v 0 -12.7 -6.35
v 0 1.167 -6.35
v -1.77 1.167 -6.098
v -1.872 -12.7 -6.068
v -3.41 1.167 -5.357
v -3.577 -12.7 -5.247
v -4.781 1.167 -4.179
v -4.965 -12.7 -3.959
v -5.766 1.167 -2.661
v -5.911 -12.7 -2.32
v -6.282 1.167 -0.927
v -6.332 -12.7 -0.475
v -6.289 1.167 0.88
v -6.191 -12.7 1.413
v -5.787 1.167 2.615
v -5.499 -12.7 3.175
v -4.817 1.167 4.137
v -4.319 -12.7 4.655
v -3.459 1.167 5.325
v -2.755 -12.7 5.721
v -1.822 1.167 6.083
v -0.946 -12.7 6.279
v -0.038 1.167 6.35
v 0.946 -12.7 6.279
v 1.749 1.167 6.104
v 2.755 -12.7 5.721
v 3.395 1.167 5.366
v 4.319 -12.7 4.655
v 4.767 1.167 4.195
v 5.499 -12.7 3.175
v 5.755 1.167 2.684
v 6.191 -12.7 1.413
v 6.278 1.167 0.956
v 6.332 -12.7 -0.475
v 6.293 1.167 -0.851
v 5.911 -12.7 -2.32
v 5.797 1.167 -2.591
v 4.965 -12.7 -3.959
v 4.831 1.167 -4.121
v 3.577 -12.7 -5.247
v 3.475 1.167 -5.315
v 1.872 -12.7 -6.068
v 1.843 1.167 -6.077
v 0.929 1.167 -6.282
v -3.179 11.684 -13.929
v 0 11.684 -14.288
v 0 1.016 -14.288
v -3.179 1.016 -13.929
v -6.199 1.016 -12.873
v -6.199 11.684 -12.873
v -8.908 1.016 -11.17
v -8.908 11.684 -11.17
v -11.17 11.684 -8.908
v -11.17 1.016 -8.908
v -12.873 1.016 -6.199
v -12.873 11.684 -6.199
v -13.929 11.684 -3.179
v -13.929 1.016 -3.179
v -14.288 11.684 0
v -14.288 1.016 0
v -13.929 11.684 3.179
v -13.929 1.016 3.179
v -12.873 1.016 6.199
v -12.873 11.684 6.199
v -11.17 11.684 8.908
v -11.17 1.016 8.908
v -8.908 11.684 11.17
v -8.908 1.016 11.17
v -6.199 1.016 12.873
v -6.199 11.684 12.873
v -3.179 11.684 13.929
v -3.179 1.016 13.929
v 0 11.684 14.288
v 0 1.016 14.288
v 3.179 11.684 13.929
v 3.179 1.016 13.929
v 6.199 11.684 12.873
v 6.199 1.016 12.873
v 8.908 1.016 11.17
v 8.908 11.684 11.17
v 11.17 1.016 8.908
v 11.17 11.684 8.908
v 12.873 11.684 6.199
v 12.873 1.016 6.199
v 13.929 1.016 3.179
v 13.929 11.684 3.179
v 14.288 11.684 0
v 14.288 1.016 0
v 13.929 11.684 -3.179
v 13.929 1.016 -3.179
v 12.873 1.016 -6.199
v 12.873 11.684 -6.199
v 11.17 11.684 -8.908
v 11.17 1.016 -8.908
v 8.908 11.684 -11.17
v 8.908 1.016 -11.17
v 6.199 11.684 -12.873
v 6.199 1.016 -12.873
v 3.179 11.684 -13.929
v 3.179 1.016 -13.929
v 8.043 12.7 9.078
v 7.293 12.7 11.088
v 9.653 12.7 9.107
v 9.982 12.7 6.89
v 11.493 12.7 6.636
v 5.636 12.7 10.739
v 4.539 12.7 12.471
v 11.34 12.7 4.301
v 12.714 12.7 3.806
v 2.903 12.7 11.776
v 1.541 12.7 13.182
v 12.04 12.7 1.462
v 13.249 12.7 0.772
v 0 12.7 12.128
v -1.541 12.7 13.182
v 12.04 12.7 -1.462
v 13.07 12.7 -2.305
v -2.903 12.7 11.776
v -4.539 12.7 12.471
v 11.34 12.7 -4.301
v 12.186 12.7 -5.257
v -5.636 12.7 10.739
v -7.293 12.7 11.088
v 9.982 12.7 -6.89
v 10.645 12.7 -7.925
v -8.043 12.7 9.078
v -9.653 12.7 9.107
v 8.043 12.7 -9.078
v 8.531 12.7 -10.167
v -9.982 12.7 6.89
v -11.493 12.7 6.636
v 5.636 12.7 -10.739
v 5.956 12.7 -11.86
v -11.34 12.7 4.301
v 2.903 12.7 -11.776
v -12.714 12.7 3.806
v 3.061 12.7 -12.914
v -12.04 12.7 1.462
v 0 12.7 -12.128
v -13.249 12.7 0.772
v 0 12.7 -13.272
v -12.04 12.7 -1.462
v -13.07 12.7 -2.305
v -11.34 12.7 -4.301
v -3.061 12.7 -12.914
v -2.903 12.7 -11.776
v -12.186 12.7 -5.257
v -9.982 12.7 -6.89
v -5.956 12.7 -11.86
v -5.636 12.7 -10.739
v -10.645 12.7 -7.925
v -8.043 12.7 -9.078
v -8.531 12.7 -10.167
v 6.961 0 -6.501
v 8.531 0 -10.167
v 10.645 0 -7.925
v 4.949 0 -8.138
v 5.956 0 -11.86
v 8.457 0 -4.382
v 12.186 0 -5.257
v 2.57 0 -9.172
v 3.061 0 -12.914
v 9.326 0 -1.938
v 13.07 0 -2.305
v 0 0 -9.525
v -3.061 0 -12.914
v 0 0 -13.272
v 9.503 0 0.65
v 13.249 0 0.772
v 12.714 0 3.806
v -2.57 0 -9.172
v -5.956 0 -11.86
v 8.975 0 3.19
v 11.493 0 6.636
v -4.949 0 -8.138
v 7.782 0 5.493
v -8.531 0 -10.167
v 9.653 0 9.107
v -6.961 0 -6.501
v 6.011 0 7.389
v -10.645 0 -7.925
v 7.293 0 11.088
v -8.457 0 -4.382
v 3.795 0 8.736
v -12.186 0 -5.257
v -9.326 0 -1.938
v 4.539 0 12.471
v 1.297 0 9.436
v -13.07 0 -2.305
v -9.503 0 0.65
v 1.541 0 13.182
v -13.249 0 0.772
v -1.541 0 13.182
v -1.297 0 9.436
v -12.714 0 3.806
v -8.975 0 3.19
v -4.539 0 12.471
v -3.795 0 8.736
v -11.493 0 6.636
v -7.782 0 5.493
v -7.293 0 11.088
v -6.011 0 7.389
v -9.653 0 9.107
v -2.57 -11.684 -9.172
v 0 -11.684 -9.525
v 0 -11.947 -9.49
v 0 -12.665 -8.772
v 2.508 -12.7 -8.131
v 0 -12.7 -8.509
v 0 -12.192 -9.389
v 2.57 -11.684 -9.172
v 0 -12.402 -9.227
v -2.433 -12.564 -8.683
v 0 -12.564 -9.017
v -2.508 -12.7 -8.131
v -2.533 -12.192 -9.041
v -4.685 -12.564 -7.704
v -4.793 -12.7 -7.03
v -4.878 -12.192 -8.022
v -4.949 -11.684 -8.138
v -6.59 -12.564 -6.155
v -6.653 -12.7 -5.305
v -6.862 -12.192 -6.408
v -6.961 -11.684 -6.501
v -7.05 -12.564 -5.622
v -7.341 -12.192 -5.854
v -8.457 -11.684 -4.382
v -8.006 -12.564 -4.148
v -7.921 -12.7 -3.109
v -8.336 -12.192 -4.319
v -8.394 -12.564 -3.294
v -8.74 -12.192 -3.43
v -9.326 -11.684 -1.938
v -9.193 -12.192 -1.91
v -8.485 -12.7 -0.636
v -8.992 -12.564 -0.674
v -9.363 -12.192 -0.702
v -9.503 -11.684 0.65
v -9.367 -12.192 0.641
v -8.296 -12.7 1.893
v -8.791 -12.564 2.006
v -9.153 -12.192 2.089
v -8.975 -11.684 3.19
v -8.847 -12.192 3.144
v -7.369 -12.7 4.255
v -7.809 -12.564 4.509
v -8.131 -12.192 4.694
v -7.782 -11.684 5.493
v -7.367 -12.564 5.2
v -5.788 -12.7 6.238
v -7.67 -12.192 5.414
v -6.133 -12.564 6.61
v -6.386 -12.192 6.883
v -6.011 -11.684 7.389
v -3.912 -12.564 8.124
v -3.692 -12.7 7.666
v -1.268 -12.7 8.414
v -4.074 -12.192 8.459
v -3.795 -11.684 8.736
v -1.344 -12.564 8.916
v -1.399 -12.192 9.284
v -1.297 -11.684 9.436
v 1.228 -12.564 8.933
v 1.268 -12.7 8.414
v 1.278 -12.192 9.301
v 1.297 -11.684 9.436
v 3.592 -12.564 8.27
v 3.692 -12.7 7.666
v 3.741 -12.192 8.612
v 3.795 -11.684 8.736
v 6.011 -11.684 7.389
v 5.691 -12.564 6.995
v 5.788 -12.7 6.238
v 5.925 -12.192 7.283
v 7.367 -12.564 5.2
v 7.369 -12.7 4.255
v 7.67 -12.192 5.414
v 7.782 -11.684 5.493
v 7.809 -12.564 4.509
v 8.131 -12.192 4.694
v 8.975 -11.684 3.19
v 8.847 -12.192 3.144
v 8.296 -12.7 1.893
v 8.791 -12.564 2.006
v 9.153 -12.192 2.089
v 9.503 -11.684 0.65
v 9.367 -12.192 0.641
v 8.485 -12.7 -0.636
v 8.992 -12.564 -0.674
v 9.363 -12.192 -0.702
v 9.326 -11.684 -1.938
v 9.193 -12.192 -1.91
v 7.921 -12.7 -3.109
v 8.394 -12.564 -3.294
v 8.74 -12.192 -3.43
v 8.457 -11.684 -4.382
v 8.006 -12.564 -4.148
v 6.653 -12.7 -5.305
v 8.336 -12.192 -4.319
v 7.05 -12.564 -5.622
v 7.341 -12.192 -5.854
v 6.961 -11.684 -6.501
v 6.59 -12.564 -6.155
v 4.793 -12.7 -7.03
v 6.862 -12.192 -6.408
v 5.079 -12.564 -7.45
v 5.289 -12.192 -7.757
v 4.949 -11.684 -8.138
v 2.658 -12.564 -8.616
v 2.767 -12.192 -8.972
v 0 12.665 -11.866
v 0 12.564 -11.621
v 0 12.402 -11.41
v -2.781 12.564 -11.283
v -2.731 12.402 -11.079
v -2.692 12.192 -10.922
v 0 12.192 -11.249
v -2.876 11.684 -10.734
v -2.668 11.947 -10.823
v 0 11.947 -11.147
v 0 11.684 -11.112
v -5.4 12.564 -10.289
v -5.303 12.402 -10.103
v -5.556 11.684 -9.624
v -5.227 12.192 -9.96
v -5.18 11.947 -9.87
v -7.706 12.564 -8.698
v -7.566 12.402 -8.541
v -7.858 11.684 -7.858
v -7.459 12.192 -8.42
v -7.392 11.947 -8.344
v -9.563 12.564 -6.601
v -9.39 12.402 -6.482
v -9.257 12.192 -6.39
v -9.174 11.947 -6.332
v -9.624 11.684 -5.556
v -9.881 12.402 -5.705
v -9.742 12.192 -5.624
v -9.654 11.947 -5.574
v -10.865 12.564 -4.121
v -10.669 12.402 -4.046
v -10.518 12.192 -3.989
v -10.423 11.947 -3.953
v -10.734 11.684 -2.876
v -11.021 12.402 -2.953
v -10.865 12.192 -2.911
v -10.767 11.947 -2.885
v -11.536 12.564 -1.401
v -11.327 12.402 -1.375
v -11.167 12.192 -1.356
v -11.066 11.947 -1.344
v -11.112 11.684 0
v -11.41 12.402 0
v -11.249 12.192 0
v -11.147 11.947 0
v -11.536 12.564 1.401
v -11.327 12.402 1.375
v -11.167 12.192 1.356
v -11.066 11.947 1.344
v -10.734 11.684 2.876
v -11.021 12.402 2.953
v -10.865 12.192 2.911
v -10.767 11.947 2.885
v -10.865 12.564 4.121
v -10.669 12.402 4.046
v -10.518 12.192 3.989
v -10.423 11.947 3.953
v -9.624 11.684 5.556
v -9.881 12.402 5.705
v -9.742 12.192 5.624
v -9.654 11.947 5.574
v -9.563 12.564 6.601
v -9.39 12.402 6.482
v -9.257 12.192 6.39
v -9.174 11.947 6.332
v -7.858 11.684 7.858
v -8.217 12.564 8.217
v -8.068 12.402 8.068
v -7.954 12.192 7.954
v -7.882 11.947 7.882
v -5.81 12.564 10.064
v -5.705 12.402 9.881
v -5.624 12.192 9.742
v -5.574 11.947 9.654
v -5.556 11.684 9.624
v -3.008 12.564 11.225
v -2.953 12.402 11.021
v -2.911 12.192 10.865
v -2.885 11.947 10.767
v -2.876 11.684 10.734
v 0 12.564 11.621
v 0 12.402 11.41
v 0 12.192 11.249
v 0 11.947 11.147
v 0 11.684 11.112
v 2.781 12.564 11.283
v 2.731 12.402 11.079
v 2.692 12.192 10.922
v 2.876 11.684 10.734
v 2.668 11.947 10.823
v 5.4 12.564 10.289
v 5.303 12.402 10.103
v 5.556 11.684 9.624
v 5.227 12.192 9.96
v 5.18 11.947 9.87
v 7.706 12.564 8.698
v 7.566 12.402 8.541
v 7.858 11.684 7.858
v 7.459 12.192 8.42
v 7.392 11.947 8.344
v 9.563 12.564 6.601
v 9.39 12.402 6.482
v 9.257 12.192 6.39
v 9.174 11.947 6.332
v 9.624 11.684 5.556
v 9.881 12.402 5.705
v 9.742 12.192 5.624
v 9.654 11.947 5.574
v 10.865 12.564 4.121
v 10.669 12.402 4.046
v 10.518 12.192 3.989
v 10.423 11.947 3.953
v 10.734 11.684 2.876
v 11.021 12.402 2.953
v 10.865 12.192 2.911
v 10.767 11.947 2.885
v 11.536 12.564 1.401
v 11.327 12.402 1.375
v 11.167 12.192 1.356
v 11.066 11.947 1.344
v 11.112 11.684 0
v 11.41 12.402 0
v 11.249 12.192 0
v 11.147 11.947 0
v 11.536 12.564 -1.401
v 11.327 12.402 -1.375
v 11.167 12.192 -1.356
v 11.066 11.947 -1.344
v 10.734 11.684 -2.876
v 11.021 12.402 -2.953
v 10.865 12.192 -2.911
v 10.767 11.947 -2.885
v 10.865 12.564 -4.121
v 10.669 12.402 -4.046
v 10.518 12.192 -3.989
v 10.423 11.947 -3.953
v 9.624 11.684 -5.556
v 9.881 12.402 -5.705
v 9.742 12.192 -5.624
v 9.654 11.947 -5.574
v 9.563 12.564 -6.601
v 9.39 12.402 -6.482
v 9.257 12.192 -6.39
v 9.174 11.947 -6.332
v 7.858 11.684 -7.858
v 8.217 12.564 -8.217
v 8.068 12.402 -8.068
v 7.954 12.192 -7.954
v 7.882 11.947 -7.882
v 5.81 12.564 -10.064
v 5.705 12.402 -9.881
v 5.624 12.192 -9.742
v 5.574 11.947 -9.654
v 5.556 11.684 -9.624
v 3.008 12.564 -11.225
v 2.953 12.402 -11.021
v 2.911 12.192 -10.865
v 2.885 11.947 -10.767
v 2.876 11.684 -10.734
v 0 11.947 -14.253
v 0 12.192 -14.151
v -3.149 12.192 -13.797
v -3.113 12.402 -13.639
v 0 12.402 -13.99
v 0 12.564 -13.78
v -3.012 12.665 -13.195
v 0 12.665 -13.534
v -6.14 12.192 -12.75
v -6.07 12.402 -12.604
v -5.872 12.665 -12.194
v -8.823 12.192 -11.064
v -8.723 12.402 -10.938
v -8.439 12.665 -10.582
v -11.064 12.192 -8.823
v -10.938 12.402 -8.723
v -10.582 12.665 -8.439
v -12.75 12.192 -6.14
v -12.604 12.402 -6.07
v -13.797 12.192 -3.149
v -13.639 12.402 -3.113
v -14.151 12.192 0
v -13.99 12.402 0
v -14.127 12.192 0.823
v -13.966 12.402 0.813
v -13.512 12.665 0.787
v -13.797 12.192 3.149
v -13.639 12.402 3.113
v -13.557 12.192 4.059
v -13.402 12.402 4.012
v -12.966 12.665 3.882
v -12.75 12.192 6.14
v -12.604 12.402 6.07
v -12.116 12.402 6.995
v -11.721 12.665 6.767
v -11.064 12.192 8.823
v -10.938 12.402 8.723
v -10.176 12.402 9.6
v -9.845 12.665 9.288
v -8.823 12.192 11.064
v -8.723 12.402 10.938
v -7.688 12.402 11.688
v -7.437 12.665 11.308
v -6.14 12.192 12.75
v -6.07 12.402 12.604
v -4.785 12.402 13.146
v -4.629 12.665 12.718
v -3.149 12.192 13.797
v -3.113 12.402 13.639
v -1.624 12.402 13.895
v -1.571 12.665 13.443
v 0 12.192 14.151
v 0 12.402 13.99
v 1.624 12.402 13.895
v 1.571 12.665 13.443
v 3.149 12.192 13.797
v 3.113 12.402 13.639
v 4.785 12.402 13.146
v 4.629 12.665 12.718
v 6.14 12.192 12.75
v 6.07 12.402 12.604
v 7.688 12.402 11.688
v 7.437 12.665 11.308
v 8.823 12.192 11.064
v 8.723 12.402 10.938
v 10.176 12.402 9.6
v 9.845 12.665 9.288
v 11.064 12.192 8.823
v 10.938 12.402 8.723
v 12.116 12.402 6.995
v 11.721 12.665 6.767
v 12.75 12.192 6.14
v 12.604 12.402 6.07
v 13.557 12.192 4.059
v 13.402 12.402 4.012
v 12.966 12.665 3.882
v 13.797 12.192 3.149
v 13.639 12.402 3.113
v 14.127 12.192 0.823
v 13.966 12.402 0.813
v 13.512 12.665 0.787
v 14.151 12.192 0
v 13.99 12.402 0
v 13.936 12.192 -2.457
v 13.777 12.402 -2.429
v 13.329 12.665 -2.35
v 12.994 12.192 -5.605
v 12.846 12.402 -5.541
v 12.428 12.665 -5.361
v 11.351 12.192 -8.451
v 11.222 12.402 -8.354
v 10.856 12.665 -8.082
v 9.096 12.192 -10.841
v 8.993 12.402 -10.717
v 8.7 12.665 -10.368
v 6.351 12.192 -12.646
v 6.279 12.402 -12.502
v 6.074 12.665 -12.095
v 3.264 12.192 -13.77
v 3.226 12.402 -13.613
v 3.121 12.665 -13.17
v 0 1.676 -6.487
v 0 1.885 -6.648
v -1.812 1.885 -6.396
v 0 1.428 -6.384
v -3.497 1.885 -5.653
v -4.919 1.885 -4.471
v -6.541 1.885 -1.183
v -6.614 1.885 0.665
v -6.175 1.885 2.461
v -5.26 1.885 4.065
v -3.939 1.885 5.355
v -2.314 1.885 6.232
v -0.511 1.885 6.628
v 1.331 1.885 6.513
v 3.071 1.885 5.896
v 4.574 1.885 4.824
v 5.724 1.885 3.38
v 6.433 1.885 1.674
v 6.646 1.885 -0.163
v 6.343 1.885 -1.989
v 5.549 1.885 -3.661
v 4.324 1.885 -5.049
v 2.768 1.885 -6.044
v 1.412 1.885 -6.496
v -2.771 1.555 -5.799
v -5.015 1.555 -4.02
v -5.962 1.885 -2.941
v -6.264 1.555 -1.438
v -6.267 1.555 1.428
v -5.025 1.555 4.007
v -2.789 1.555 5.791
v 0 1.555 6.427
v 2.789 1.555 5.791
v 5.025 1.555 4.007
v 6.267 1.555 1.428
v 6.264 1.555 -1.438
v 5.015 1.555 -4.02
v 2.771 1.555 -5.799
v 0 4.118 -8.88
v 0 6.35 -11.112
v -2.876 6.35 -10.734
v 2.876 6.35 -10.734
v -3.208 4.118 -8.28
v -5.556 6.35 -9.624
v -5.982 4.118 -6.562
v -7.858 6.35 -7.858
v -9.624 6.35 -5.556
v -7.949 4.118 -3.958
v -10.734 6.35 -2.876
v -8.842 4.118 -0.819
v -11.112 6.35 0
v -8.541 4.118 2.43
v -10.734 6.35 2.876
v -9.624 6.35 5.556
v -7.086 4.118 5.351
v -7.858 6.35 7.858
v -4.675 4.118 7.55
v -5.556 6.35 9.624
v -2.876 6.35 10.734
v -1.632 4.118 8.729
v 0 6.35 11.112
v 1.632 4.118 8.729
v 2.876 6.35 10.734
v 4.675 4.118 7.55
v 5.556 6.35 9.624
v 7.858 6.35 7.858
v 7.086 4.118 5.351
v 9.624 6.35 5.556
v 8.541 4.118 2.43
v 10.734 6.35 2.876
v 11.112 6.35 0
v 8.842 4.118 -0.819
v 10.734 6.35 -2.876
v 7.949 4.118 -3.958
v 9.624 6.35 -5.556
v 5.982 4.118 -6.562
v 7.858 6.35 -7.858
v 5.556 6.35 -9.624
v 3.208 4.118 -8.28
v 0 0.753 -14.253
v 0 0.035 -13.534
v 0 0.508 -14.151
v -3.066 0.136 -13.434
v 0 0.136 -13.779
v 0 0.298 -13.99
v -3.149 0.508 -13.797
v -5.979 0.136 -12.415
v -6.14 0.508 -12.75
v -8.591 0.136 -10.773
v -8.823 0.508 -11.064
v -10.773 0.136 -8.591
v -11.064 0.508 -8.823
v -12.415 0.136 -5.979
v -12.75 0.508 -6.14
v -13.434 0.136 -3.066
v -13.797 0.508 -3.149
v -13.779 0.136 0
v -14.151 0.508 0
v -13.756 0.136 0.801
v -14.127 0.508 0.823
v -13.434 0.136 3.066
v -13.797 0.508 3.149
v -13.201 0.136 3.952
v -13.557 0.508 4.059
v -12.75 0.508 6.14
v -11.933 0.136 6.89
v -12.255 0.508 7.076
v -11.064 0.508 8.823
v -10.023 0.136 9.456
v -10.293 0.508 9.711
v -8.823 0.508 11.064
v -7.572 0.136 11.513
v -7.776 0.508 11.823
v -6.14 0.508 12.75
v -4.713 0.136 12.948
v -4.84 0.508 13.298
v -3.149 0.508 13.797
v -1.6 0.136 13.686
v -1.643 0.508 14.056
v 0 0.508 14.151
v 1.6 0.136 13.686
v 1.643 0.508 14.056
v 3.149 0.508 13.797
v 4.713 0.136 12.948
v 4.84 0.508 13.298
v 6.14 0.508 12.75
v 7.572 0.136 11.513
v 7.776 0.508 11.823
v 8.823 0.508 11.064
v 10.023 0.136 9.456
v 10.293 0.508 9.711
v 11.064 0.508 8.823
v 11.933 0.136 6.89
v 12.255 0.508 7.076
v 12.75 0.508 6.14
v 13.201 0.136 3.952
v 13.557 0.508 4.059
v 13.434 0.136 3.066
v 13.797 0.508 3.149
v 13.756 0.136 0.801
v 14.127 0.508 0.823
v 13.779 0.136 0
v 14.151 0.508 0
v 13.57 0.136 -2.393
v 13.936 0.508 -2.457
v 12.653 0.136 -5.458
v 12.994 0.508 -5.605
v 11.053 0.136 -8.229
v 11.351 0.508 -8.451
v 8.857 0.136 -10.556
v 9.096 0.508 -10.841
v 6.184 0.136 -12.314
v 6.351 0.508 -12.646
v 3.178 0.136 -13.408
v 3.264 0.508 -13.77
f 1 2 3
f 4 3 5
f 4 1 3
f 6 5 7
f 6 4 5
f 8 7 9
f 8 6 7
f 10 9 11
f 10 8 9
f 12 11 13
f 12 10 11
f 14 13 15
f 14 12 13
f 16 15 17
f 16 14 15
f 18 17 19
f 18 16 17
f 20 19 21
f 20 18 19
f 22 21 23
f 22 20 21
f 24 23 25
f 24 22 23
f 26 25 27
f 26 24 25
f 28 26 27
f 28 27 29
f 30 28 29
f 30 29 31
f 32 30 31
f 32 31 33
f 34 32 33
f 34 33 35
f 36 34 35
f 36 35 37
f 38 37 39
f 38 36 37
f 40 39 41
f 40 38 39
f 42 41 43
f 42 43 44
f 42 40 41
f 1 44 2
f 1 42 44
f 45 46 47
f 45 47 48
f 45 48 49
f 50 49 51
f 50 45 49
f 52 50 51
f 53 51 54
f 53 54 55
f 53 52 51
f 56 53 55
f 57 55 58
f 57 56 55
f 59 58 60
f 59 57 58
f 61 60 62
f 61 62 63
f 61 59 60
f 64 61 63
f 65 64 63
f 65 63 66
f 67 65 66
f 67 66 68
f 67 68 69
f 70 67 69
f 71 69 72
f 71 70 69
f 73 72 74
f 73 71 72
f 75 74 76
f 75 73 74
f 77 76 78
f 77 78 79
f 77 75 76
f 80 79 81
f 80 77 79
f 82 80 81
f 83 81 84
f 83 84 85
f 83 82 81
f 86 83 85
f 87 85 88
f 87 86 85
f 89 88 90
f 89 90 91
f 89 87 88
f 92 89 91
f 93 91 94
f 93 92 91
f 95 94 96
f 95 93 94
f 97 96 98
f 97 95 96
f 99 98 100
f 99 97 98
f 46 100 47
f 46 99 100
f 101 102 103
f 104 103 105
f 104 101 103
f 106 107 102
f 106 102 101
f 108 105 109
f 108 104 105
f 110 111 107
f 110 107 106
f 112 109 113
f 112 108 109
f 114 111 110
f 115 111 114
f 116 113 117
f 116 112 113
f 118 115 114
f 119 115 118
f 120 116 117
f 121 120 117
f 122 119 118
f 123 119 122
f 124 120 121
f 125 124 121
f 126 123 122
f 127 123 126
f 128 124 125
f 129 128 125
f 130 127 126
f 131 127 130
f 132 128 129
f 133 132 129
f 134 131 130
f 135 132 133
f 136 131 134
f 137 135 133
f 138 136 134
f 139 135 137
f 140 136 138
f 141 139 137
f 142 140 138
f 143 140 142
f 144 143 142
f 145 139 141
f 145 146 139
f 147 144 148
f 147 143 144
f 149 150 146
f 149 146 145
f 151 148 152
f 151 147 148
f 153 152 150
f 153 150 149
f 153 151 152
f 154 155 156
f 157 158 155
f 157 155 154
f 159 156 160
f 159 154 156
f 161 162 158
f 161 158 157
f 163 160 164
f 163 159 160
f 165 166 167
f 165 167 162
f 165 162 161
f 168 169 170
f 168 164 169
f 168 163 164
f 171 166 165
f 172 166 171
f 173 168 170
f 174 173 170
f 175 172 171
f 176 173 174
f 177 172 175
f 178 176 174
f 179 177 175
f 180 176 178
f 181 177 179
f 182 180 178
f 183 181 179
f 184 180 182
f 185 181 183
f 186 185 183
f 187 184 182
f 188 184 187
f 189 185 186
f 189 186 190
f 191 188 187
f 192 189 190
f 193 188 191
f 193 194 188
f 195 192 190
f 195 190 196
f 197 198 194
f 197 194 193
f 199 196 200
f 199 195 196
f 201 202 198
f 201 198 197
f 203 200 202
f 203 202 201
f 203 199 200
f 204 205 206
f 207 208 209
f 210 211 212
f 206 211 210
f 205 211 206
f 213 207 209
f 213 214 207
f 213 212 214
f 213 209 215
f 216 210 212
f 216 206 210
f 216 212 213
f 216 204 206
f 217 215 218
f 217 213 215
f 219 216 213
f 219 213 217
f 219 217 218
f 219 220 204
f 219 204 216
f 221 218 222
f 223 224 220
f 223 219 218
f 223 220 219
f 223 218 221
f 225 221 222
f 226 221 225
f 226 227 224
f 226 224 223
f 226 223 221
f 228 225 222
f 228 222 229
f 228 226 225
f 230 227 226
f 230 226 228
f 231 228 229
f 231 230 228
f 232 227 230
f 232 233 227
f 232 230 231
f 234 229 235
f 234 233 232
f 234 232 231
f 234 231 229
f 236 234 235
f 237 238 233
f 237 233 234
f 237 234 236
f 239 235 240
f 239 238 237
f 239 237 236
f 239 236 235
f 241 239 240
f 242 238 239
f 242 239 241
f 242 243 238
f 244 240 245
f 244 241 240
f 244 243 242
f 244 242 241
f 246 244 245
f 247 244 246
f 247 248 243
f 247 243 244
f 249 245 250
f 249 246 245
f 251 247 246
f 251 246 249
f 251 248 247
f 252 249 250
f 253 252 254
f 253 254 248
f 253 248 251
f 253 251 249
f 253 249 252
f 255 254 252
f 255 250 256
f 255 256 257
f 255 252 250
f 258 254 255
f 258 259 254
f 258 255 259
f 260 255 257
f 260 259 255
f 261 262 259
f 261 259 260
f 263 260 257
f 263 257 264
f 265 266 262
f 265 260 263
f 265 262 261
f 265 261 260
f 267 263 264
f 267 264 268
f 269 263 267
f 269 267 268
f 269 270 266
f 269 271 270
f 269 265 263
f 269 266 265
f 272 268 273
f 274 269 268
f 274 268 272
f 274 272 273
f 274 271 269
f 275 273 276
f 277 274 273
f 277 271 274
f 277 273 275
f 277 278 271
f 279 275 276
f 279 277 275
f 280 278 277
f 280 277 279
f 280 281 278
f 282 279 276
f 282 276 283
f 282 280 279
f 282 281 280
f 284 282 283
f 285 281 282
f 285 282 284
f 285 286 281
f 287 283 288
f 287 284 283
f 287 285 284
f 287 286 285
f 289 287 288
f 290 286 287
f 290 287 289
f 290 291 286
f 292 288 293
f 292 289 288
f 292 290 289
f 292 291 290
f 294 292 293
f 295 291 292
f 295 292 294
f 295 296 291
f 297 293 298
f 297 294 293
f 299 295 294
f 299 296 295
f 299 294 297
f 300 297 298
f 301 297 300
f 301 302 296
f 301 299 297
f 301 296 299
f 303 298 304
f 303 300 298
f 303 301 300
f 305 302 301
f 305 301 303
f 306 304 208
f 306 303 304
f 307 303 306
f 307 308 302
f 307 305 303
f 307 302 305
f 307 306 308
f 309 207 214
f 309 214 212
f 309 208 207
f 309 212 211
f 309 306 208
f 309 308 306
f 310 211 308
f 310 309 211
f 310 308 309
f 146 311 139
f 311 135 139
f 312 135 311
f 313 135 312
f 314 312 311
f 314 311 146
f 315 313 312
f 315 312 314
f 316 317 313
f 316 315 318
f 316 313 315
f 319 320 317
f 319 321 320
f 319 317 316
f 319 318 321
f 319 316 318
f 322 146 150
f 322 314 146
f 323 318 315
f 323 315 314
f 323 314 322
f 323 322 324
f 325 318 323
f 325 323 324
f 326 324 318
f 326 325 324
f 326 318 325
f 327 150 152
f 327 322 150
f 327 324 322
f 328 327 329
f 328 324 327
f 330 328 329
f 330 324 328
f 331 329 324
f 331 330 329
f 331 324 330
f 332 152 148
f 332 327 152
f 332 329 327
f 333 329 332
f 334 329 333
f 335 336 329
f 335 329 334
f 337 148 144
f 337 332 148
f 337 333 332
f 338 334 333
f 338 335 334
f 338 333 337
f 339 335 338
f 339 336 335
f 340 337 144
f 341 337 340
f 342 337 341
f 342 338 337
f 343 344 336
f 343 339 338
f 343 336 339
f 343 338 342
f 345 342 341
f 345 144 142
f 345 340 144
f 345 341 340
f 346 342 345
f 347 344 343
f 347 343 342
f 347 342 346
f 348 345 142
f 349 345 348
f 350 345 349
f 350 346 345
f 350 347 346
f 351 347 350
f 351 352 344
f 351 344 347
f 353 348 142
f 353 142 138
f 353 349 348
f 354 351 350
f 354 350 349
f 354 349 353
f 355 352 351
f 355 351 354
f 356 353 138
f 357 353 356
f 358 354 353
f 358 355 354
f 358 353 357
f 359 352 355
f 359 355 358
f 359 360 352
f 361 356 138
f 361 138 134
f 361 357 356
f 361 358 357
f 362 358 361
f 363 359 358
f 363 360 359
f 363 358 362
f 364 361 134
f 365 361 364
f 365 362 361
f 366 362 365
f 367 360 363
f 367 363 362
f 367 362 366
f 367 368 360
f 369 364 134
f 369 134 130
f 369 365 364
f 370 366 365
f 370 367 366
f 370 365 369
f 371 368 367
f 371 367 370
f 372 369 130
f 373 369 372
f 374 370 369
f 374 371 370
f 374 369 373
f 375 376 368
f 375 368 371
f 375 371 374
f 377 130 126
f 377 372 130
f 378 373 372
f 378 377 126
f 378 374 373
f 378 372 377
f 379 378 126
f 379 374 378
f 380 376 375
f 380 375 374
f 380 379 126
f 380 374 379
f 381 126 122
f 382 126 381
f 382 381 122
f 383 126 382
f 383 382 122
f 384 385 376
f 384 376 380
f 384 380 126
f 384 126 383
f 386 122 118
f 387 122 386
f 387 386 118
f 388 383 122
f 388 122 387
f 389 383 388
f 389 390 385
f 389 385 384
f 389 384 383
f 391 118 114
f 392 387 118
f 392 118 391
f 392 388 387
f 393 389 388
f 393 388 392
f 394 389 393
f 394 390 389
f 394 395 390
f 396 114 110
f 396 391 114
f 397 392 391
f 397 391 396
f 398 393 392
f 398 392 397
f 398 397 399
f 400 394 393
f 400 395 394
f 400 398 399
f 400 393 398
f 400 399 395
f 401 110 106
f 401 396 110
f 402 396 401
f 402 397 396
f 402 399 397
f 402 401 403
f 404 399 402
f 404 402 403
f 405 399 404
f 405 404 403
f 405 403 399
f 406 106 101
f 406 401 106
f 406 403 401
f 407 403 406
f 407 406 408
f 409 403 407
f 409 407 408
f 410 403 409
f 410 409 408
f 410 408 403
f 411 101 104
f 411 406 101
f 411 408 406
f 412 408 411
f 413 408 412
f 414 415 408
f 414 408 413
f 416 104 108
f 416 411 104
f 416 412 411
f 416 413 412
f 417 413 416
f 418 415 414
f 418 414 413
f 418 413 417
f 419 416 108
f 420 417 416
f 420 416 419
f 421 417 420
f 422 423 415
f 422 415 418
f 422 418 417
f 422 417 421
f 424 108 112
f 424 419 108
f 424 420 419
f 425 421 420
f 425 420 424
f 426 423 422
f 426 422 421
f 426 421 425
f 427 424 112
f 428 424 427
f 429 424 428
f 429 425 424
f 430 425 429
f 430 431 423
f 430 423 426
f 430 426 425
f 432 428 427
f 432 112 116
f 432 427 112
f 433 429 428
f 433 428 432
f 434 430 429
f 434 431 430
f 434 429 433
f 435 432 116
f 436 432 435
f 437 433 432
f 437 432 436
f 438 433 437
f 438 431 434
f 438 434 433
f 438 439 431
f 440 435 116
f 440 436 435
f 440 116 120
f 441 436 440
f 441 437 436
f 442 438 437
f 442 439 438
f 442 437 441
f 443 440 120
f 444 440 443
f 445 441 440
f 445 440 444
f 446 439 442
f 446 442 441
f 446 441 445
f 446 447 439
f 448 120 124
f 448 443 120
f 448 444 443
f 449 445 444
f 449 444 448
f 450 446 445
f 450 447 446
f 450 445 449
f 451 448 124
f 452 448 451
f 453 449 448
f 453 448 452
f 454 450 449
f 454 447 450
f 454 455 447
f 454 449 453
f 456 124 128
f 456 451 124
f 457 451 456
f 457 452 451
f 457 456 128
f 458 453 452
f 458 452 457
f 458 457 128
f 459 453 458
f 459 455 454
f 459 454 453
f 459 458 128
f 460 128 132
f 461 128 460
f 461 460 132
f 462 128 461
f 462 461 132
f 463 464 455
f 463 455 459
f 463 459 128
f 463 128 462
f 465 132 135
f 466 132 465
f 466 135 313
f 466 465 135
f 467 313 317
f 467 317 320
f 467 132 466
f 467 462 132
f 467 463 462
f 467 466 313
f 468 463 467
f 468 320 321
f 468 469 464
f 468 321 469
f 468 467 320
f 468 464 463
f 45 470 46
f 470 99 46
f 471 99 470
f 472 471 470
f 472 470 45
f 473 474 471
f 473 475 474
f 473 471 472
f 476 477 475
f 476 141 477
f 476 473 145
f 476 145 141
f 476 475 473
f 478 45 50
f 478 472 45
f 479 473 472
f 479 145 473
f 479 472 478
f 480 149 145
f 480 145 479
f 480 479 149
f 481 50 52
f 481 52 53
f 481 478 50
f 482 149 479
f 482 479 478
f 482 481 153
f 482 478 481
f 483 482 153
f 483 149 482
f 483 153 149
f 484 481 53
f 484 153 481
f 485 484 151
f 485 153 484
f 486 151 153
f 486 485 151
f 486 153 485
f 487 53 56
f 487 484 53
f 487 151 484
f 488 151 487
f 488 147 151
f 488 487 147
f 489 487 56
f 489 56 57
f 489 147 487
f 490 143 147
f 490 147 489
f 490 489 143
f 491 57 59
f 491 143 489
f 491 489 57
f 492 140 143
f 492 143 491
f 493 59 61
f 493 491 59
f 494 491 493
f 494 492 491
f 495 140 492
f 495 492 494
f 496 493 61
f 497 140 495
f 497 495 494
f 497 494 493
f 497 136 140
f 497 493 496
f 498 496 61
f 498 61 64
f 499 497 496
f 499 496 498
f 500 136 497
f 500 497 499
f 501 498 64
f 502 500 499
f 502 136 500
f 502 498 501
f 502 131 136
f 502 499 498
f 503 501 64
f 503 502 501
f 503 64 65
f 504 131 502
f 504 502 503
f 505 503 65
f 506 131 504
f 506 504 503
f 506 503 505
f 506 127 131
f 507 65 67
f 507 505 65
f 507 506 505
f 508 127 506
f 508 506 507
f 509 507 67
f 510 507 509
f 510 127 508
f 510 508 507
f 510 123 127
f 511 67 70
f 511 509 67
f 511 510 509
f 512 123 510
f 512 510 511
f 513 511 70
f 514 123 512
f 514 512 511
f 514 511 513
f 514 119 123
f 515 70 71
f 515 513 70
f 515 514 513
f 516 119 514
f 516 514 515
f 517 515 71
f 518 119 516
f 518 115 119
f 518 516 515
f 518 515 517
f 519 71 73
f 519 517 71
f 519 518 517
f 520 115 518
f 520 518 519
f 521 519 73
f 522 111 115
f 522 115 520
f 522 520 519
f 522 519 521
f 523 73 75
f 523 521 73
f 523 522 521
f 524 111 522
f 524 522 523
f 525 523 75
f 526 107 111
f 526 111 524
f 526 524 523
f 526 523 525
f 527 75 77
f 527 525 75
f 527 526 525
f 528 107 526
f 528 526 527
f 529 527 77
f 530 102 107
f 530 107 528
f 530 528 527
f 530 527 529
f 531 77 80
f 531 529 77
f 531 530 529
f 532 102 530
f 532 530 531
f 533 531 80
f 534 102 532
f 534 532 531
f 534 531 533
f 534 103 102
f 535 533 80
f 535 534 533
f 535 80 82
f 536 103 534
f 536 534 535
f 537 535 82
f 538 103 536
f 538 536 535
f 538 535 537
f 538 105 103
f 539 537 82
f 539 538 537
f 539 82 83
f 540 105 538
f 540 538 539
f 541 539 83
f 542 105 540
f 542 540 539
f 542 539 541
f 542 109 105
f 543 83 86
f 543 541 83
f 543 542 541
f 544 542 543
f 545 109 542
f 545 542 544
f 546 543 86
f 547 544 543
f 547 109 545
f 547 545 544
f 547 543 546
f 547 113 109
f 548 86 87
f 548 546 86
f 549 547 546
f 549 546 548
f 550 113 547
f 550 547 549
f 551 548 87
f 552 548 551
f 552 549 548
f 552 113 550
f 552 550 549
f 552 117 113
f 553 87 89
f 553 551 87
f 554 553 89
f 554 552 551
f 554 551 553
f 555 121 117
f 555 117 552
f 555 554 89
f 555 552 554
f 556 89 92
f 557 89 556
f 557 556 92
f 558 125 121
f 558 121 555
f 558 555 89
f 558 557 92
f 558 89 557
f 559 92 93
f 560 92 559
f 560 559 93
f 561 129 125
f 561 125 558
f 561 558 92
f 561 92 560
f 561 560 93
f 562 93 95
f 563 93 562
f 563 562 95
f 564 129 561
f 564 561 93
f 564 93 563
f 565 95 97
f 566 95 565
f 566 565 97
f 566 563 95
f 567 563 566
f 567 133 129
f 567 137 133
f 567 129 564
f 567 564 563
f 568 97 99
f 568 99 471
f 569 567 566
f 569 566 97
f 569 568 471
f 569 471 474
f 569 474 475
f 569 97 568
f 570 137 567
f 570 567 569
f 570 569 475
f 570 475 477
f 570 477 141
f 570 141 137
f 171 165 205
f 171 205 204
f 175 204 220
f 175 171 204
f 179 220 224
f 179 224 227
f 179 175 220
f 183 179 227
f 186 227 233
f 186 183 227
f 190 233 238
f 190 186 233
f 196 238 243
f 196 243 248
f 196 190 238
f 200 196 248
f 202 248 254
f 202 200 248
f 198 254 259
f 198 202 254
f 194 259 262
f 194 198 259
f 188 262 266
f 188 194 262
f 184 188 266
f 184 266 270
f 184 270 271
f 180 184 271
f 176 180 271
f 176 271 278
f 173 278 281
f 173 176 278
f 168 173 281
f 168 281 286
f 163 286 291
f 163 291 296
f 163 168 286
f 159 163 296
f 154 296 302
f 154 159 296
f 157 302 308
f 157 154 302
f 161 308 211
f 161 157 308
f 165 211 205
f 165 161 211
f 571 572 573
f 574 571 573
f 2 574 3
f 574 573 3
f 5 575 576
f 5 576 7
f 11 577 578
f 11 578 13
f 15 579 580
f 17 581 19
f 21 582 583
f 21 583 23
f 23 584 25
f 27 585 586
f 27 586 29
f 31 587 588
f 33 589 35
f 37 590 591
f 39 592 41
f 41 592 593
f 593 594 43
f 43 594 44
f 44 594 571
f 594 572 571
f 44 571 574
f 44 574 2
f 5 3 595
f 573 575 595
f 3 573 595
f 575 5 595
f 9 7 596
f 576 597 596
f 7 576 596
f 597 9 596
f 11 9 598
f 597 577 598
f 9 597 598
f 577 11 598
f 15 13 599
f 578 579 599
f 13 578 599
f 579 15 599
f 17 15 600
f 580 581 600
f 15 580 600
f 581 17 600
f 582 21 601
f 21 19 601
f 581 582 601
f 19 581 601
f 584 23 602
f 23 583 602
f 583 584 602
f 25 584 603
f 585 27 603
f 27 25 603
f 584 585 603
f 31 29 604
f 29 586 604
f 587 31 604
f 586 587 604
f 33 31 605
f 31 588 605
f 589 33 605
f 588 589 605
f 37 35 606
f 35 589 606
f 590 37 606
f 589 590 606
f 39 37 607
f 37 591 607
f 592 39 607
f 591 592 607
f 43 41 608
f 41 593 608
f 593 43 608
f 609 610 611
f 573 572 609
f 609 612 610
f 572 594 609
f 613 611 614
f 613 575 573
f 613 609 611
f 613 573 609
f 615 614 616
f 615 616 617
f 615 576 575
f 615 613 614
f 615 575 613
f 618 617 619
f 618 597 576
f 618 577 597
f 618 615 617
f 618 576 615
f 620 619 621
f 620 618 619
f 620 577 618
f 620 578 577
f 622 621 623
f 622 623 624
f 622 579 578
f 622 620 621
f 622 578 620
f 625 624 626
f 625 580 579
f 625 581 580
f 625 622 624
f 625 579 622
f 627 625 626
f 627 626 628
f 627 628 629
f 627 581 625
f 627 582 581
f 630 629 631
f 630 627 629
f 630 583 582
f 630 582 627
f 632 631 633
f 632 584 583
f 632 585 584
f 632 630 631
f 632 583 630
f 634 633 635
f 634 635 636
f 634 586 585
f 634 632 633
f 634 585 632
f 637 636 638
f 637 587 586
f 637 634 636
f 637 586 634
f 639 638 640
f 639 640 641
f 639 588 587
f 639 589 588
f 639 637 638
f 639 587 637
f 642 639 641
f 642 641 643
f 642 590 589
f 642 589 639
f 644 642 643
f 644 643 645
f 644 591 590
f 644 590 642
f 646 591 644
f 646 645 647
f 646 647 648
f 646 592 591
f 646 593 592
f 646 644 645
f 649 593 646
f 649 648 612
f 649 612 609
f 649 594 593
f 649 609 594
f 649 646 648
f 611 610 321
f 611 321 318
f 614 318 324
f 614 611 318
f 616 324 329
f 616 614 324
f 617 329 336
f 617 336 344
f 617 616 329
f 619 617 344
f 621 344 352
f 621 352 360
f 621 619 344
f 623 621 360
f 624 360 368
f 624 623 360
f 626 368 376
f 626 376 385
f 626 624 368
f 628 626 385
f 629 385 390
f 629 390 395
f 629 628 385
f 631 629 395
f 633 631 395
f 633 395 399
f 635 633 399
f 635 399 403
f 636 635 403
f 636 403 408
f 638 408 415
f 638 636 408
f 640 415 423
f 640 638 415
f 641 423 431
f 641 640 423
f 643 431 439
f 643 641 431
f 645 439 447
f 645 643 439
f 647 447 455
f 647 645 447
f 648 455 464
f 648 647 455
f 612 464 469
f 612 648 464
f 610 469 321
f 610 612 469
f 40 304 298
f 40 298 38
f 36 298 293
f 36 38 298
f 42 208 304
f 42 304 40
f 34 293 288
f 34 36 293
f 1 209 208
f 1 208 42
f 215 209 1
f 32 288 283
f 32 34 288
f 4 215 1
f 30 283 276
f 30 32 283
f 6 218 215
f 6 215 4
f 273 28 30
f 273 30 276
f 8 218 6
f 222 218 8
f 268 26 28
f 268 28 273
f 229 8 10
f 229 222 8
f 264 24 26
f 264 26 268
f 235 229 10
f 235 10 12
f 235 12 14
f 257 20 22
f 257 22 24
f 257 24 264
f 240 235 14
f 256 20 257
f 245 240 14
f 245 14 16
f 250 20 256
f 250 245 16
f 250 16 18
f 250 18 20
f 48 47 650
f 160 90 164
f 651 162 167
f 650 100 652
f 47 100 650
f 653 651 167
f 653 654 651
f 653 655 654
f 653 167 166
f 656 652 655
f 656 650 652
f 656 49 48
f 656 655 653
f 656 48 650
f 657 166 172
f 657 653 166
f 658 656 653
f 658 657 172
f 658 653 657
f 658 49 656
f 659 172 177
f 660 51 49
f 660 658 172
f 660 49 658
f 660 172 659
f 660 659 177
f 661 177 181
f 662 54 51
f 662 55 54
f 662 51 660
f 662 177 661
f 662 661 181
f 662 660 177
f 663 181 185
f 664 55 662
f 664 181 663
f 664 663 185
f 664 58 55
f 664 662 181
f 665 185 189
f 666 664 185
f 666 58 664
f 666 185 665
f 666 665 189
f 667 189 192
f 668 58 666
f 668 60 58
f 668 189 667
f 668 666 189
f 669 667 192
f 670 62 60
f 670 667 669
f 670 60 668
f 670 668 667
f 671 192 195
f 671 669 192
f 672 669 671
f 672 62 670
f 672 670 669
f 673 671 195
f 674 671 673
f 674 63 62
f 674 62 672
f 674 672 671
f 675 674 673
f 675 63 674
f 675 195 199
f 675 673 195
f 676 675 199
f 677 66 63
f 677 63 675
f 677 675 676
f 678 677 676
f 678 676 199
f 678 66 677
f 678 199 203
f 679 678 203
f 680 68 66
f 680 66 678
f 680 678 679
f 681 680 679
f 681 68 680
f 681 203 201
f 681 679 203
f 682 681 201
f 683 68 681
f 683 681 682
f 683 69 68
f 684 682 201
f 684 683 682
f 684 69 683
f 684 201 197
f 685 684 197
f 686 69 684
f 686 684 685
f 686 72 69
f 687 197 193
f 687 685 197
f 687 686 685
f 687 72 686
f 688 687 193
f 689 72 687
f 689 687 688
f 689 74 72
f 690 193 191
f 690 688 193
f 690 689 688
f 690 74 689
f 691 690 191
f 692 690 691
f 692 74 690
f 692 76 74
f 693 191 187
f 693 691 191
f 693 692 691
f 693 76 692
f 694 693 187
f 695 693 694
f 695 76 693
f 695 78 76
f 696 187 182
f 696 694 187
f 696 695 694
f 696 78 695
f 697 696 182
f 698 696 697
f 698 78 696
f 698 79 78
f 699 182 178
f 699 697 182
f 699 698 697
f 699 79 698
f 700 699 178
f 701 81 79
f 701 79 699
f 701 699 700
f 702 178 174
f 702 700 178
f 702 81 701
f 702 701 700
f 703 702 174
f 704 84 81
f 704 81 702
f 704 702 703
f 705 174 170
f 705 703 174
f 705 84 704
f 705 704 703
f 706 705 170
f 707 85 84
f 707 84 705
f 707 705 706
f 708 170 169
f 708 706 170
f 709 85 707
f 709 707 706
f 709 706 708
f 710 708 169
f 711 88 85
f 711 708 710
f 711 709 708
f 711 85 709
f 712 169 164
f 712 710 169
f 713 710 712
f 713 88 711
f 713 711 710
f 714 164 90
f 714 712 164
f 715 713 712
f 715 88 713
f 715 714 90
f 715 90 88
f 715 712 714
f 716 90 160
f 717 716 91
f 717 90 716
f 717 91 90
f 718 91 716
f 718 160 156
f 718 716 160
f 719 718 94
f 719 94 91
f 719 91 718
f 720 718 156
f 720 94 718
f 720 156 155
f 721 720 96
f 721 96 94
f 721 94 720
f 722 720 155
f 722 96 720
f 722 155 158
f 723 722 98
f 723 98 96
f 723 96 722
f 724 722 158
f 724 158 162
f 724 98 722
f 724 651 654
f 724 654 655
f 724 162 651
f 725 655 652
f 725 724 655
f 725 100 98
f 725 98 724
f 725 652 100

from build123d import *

# Parameters (mm, degrees)
RADYUS1_R = 1.016


with BuildPart() as part:
    # Sketch1 → Döndür1 (revolve)
    with BuildSketch(Plane.XY, mode=Mode.PRIVATE) as d_nd_r1_sk:
        Polygon((6.35, -12.7), (9.525, -12.7), (9.525, 0), (14.2875, 0), (14.2875, 12.7), (11.1125, 12.7), (11.1125, 6.35), (6.35, 1.5875), align=None)
    revolve(d_nd_r1_sk.sketch.rotate(Axis((0, 0, 0), (0, 1, 0)), 90), axis=Axis((0, 0, 0), (0, 1, 0)))

    # Radyus1
    radyus1_edges = [part.edges().sort_by_distance(p)[0] for p in [
        (0, 1.5875, 6.35),
        (0, 12.7, 11.1125),
        (0, 12.7, 14.2875),
        (0, 0, 14.2875),
        (0, -12.7, 9.525),
    ]]
    fillet(radyus1_edges, radius=RADYUS1_R)


solid = part.part
